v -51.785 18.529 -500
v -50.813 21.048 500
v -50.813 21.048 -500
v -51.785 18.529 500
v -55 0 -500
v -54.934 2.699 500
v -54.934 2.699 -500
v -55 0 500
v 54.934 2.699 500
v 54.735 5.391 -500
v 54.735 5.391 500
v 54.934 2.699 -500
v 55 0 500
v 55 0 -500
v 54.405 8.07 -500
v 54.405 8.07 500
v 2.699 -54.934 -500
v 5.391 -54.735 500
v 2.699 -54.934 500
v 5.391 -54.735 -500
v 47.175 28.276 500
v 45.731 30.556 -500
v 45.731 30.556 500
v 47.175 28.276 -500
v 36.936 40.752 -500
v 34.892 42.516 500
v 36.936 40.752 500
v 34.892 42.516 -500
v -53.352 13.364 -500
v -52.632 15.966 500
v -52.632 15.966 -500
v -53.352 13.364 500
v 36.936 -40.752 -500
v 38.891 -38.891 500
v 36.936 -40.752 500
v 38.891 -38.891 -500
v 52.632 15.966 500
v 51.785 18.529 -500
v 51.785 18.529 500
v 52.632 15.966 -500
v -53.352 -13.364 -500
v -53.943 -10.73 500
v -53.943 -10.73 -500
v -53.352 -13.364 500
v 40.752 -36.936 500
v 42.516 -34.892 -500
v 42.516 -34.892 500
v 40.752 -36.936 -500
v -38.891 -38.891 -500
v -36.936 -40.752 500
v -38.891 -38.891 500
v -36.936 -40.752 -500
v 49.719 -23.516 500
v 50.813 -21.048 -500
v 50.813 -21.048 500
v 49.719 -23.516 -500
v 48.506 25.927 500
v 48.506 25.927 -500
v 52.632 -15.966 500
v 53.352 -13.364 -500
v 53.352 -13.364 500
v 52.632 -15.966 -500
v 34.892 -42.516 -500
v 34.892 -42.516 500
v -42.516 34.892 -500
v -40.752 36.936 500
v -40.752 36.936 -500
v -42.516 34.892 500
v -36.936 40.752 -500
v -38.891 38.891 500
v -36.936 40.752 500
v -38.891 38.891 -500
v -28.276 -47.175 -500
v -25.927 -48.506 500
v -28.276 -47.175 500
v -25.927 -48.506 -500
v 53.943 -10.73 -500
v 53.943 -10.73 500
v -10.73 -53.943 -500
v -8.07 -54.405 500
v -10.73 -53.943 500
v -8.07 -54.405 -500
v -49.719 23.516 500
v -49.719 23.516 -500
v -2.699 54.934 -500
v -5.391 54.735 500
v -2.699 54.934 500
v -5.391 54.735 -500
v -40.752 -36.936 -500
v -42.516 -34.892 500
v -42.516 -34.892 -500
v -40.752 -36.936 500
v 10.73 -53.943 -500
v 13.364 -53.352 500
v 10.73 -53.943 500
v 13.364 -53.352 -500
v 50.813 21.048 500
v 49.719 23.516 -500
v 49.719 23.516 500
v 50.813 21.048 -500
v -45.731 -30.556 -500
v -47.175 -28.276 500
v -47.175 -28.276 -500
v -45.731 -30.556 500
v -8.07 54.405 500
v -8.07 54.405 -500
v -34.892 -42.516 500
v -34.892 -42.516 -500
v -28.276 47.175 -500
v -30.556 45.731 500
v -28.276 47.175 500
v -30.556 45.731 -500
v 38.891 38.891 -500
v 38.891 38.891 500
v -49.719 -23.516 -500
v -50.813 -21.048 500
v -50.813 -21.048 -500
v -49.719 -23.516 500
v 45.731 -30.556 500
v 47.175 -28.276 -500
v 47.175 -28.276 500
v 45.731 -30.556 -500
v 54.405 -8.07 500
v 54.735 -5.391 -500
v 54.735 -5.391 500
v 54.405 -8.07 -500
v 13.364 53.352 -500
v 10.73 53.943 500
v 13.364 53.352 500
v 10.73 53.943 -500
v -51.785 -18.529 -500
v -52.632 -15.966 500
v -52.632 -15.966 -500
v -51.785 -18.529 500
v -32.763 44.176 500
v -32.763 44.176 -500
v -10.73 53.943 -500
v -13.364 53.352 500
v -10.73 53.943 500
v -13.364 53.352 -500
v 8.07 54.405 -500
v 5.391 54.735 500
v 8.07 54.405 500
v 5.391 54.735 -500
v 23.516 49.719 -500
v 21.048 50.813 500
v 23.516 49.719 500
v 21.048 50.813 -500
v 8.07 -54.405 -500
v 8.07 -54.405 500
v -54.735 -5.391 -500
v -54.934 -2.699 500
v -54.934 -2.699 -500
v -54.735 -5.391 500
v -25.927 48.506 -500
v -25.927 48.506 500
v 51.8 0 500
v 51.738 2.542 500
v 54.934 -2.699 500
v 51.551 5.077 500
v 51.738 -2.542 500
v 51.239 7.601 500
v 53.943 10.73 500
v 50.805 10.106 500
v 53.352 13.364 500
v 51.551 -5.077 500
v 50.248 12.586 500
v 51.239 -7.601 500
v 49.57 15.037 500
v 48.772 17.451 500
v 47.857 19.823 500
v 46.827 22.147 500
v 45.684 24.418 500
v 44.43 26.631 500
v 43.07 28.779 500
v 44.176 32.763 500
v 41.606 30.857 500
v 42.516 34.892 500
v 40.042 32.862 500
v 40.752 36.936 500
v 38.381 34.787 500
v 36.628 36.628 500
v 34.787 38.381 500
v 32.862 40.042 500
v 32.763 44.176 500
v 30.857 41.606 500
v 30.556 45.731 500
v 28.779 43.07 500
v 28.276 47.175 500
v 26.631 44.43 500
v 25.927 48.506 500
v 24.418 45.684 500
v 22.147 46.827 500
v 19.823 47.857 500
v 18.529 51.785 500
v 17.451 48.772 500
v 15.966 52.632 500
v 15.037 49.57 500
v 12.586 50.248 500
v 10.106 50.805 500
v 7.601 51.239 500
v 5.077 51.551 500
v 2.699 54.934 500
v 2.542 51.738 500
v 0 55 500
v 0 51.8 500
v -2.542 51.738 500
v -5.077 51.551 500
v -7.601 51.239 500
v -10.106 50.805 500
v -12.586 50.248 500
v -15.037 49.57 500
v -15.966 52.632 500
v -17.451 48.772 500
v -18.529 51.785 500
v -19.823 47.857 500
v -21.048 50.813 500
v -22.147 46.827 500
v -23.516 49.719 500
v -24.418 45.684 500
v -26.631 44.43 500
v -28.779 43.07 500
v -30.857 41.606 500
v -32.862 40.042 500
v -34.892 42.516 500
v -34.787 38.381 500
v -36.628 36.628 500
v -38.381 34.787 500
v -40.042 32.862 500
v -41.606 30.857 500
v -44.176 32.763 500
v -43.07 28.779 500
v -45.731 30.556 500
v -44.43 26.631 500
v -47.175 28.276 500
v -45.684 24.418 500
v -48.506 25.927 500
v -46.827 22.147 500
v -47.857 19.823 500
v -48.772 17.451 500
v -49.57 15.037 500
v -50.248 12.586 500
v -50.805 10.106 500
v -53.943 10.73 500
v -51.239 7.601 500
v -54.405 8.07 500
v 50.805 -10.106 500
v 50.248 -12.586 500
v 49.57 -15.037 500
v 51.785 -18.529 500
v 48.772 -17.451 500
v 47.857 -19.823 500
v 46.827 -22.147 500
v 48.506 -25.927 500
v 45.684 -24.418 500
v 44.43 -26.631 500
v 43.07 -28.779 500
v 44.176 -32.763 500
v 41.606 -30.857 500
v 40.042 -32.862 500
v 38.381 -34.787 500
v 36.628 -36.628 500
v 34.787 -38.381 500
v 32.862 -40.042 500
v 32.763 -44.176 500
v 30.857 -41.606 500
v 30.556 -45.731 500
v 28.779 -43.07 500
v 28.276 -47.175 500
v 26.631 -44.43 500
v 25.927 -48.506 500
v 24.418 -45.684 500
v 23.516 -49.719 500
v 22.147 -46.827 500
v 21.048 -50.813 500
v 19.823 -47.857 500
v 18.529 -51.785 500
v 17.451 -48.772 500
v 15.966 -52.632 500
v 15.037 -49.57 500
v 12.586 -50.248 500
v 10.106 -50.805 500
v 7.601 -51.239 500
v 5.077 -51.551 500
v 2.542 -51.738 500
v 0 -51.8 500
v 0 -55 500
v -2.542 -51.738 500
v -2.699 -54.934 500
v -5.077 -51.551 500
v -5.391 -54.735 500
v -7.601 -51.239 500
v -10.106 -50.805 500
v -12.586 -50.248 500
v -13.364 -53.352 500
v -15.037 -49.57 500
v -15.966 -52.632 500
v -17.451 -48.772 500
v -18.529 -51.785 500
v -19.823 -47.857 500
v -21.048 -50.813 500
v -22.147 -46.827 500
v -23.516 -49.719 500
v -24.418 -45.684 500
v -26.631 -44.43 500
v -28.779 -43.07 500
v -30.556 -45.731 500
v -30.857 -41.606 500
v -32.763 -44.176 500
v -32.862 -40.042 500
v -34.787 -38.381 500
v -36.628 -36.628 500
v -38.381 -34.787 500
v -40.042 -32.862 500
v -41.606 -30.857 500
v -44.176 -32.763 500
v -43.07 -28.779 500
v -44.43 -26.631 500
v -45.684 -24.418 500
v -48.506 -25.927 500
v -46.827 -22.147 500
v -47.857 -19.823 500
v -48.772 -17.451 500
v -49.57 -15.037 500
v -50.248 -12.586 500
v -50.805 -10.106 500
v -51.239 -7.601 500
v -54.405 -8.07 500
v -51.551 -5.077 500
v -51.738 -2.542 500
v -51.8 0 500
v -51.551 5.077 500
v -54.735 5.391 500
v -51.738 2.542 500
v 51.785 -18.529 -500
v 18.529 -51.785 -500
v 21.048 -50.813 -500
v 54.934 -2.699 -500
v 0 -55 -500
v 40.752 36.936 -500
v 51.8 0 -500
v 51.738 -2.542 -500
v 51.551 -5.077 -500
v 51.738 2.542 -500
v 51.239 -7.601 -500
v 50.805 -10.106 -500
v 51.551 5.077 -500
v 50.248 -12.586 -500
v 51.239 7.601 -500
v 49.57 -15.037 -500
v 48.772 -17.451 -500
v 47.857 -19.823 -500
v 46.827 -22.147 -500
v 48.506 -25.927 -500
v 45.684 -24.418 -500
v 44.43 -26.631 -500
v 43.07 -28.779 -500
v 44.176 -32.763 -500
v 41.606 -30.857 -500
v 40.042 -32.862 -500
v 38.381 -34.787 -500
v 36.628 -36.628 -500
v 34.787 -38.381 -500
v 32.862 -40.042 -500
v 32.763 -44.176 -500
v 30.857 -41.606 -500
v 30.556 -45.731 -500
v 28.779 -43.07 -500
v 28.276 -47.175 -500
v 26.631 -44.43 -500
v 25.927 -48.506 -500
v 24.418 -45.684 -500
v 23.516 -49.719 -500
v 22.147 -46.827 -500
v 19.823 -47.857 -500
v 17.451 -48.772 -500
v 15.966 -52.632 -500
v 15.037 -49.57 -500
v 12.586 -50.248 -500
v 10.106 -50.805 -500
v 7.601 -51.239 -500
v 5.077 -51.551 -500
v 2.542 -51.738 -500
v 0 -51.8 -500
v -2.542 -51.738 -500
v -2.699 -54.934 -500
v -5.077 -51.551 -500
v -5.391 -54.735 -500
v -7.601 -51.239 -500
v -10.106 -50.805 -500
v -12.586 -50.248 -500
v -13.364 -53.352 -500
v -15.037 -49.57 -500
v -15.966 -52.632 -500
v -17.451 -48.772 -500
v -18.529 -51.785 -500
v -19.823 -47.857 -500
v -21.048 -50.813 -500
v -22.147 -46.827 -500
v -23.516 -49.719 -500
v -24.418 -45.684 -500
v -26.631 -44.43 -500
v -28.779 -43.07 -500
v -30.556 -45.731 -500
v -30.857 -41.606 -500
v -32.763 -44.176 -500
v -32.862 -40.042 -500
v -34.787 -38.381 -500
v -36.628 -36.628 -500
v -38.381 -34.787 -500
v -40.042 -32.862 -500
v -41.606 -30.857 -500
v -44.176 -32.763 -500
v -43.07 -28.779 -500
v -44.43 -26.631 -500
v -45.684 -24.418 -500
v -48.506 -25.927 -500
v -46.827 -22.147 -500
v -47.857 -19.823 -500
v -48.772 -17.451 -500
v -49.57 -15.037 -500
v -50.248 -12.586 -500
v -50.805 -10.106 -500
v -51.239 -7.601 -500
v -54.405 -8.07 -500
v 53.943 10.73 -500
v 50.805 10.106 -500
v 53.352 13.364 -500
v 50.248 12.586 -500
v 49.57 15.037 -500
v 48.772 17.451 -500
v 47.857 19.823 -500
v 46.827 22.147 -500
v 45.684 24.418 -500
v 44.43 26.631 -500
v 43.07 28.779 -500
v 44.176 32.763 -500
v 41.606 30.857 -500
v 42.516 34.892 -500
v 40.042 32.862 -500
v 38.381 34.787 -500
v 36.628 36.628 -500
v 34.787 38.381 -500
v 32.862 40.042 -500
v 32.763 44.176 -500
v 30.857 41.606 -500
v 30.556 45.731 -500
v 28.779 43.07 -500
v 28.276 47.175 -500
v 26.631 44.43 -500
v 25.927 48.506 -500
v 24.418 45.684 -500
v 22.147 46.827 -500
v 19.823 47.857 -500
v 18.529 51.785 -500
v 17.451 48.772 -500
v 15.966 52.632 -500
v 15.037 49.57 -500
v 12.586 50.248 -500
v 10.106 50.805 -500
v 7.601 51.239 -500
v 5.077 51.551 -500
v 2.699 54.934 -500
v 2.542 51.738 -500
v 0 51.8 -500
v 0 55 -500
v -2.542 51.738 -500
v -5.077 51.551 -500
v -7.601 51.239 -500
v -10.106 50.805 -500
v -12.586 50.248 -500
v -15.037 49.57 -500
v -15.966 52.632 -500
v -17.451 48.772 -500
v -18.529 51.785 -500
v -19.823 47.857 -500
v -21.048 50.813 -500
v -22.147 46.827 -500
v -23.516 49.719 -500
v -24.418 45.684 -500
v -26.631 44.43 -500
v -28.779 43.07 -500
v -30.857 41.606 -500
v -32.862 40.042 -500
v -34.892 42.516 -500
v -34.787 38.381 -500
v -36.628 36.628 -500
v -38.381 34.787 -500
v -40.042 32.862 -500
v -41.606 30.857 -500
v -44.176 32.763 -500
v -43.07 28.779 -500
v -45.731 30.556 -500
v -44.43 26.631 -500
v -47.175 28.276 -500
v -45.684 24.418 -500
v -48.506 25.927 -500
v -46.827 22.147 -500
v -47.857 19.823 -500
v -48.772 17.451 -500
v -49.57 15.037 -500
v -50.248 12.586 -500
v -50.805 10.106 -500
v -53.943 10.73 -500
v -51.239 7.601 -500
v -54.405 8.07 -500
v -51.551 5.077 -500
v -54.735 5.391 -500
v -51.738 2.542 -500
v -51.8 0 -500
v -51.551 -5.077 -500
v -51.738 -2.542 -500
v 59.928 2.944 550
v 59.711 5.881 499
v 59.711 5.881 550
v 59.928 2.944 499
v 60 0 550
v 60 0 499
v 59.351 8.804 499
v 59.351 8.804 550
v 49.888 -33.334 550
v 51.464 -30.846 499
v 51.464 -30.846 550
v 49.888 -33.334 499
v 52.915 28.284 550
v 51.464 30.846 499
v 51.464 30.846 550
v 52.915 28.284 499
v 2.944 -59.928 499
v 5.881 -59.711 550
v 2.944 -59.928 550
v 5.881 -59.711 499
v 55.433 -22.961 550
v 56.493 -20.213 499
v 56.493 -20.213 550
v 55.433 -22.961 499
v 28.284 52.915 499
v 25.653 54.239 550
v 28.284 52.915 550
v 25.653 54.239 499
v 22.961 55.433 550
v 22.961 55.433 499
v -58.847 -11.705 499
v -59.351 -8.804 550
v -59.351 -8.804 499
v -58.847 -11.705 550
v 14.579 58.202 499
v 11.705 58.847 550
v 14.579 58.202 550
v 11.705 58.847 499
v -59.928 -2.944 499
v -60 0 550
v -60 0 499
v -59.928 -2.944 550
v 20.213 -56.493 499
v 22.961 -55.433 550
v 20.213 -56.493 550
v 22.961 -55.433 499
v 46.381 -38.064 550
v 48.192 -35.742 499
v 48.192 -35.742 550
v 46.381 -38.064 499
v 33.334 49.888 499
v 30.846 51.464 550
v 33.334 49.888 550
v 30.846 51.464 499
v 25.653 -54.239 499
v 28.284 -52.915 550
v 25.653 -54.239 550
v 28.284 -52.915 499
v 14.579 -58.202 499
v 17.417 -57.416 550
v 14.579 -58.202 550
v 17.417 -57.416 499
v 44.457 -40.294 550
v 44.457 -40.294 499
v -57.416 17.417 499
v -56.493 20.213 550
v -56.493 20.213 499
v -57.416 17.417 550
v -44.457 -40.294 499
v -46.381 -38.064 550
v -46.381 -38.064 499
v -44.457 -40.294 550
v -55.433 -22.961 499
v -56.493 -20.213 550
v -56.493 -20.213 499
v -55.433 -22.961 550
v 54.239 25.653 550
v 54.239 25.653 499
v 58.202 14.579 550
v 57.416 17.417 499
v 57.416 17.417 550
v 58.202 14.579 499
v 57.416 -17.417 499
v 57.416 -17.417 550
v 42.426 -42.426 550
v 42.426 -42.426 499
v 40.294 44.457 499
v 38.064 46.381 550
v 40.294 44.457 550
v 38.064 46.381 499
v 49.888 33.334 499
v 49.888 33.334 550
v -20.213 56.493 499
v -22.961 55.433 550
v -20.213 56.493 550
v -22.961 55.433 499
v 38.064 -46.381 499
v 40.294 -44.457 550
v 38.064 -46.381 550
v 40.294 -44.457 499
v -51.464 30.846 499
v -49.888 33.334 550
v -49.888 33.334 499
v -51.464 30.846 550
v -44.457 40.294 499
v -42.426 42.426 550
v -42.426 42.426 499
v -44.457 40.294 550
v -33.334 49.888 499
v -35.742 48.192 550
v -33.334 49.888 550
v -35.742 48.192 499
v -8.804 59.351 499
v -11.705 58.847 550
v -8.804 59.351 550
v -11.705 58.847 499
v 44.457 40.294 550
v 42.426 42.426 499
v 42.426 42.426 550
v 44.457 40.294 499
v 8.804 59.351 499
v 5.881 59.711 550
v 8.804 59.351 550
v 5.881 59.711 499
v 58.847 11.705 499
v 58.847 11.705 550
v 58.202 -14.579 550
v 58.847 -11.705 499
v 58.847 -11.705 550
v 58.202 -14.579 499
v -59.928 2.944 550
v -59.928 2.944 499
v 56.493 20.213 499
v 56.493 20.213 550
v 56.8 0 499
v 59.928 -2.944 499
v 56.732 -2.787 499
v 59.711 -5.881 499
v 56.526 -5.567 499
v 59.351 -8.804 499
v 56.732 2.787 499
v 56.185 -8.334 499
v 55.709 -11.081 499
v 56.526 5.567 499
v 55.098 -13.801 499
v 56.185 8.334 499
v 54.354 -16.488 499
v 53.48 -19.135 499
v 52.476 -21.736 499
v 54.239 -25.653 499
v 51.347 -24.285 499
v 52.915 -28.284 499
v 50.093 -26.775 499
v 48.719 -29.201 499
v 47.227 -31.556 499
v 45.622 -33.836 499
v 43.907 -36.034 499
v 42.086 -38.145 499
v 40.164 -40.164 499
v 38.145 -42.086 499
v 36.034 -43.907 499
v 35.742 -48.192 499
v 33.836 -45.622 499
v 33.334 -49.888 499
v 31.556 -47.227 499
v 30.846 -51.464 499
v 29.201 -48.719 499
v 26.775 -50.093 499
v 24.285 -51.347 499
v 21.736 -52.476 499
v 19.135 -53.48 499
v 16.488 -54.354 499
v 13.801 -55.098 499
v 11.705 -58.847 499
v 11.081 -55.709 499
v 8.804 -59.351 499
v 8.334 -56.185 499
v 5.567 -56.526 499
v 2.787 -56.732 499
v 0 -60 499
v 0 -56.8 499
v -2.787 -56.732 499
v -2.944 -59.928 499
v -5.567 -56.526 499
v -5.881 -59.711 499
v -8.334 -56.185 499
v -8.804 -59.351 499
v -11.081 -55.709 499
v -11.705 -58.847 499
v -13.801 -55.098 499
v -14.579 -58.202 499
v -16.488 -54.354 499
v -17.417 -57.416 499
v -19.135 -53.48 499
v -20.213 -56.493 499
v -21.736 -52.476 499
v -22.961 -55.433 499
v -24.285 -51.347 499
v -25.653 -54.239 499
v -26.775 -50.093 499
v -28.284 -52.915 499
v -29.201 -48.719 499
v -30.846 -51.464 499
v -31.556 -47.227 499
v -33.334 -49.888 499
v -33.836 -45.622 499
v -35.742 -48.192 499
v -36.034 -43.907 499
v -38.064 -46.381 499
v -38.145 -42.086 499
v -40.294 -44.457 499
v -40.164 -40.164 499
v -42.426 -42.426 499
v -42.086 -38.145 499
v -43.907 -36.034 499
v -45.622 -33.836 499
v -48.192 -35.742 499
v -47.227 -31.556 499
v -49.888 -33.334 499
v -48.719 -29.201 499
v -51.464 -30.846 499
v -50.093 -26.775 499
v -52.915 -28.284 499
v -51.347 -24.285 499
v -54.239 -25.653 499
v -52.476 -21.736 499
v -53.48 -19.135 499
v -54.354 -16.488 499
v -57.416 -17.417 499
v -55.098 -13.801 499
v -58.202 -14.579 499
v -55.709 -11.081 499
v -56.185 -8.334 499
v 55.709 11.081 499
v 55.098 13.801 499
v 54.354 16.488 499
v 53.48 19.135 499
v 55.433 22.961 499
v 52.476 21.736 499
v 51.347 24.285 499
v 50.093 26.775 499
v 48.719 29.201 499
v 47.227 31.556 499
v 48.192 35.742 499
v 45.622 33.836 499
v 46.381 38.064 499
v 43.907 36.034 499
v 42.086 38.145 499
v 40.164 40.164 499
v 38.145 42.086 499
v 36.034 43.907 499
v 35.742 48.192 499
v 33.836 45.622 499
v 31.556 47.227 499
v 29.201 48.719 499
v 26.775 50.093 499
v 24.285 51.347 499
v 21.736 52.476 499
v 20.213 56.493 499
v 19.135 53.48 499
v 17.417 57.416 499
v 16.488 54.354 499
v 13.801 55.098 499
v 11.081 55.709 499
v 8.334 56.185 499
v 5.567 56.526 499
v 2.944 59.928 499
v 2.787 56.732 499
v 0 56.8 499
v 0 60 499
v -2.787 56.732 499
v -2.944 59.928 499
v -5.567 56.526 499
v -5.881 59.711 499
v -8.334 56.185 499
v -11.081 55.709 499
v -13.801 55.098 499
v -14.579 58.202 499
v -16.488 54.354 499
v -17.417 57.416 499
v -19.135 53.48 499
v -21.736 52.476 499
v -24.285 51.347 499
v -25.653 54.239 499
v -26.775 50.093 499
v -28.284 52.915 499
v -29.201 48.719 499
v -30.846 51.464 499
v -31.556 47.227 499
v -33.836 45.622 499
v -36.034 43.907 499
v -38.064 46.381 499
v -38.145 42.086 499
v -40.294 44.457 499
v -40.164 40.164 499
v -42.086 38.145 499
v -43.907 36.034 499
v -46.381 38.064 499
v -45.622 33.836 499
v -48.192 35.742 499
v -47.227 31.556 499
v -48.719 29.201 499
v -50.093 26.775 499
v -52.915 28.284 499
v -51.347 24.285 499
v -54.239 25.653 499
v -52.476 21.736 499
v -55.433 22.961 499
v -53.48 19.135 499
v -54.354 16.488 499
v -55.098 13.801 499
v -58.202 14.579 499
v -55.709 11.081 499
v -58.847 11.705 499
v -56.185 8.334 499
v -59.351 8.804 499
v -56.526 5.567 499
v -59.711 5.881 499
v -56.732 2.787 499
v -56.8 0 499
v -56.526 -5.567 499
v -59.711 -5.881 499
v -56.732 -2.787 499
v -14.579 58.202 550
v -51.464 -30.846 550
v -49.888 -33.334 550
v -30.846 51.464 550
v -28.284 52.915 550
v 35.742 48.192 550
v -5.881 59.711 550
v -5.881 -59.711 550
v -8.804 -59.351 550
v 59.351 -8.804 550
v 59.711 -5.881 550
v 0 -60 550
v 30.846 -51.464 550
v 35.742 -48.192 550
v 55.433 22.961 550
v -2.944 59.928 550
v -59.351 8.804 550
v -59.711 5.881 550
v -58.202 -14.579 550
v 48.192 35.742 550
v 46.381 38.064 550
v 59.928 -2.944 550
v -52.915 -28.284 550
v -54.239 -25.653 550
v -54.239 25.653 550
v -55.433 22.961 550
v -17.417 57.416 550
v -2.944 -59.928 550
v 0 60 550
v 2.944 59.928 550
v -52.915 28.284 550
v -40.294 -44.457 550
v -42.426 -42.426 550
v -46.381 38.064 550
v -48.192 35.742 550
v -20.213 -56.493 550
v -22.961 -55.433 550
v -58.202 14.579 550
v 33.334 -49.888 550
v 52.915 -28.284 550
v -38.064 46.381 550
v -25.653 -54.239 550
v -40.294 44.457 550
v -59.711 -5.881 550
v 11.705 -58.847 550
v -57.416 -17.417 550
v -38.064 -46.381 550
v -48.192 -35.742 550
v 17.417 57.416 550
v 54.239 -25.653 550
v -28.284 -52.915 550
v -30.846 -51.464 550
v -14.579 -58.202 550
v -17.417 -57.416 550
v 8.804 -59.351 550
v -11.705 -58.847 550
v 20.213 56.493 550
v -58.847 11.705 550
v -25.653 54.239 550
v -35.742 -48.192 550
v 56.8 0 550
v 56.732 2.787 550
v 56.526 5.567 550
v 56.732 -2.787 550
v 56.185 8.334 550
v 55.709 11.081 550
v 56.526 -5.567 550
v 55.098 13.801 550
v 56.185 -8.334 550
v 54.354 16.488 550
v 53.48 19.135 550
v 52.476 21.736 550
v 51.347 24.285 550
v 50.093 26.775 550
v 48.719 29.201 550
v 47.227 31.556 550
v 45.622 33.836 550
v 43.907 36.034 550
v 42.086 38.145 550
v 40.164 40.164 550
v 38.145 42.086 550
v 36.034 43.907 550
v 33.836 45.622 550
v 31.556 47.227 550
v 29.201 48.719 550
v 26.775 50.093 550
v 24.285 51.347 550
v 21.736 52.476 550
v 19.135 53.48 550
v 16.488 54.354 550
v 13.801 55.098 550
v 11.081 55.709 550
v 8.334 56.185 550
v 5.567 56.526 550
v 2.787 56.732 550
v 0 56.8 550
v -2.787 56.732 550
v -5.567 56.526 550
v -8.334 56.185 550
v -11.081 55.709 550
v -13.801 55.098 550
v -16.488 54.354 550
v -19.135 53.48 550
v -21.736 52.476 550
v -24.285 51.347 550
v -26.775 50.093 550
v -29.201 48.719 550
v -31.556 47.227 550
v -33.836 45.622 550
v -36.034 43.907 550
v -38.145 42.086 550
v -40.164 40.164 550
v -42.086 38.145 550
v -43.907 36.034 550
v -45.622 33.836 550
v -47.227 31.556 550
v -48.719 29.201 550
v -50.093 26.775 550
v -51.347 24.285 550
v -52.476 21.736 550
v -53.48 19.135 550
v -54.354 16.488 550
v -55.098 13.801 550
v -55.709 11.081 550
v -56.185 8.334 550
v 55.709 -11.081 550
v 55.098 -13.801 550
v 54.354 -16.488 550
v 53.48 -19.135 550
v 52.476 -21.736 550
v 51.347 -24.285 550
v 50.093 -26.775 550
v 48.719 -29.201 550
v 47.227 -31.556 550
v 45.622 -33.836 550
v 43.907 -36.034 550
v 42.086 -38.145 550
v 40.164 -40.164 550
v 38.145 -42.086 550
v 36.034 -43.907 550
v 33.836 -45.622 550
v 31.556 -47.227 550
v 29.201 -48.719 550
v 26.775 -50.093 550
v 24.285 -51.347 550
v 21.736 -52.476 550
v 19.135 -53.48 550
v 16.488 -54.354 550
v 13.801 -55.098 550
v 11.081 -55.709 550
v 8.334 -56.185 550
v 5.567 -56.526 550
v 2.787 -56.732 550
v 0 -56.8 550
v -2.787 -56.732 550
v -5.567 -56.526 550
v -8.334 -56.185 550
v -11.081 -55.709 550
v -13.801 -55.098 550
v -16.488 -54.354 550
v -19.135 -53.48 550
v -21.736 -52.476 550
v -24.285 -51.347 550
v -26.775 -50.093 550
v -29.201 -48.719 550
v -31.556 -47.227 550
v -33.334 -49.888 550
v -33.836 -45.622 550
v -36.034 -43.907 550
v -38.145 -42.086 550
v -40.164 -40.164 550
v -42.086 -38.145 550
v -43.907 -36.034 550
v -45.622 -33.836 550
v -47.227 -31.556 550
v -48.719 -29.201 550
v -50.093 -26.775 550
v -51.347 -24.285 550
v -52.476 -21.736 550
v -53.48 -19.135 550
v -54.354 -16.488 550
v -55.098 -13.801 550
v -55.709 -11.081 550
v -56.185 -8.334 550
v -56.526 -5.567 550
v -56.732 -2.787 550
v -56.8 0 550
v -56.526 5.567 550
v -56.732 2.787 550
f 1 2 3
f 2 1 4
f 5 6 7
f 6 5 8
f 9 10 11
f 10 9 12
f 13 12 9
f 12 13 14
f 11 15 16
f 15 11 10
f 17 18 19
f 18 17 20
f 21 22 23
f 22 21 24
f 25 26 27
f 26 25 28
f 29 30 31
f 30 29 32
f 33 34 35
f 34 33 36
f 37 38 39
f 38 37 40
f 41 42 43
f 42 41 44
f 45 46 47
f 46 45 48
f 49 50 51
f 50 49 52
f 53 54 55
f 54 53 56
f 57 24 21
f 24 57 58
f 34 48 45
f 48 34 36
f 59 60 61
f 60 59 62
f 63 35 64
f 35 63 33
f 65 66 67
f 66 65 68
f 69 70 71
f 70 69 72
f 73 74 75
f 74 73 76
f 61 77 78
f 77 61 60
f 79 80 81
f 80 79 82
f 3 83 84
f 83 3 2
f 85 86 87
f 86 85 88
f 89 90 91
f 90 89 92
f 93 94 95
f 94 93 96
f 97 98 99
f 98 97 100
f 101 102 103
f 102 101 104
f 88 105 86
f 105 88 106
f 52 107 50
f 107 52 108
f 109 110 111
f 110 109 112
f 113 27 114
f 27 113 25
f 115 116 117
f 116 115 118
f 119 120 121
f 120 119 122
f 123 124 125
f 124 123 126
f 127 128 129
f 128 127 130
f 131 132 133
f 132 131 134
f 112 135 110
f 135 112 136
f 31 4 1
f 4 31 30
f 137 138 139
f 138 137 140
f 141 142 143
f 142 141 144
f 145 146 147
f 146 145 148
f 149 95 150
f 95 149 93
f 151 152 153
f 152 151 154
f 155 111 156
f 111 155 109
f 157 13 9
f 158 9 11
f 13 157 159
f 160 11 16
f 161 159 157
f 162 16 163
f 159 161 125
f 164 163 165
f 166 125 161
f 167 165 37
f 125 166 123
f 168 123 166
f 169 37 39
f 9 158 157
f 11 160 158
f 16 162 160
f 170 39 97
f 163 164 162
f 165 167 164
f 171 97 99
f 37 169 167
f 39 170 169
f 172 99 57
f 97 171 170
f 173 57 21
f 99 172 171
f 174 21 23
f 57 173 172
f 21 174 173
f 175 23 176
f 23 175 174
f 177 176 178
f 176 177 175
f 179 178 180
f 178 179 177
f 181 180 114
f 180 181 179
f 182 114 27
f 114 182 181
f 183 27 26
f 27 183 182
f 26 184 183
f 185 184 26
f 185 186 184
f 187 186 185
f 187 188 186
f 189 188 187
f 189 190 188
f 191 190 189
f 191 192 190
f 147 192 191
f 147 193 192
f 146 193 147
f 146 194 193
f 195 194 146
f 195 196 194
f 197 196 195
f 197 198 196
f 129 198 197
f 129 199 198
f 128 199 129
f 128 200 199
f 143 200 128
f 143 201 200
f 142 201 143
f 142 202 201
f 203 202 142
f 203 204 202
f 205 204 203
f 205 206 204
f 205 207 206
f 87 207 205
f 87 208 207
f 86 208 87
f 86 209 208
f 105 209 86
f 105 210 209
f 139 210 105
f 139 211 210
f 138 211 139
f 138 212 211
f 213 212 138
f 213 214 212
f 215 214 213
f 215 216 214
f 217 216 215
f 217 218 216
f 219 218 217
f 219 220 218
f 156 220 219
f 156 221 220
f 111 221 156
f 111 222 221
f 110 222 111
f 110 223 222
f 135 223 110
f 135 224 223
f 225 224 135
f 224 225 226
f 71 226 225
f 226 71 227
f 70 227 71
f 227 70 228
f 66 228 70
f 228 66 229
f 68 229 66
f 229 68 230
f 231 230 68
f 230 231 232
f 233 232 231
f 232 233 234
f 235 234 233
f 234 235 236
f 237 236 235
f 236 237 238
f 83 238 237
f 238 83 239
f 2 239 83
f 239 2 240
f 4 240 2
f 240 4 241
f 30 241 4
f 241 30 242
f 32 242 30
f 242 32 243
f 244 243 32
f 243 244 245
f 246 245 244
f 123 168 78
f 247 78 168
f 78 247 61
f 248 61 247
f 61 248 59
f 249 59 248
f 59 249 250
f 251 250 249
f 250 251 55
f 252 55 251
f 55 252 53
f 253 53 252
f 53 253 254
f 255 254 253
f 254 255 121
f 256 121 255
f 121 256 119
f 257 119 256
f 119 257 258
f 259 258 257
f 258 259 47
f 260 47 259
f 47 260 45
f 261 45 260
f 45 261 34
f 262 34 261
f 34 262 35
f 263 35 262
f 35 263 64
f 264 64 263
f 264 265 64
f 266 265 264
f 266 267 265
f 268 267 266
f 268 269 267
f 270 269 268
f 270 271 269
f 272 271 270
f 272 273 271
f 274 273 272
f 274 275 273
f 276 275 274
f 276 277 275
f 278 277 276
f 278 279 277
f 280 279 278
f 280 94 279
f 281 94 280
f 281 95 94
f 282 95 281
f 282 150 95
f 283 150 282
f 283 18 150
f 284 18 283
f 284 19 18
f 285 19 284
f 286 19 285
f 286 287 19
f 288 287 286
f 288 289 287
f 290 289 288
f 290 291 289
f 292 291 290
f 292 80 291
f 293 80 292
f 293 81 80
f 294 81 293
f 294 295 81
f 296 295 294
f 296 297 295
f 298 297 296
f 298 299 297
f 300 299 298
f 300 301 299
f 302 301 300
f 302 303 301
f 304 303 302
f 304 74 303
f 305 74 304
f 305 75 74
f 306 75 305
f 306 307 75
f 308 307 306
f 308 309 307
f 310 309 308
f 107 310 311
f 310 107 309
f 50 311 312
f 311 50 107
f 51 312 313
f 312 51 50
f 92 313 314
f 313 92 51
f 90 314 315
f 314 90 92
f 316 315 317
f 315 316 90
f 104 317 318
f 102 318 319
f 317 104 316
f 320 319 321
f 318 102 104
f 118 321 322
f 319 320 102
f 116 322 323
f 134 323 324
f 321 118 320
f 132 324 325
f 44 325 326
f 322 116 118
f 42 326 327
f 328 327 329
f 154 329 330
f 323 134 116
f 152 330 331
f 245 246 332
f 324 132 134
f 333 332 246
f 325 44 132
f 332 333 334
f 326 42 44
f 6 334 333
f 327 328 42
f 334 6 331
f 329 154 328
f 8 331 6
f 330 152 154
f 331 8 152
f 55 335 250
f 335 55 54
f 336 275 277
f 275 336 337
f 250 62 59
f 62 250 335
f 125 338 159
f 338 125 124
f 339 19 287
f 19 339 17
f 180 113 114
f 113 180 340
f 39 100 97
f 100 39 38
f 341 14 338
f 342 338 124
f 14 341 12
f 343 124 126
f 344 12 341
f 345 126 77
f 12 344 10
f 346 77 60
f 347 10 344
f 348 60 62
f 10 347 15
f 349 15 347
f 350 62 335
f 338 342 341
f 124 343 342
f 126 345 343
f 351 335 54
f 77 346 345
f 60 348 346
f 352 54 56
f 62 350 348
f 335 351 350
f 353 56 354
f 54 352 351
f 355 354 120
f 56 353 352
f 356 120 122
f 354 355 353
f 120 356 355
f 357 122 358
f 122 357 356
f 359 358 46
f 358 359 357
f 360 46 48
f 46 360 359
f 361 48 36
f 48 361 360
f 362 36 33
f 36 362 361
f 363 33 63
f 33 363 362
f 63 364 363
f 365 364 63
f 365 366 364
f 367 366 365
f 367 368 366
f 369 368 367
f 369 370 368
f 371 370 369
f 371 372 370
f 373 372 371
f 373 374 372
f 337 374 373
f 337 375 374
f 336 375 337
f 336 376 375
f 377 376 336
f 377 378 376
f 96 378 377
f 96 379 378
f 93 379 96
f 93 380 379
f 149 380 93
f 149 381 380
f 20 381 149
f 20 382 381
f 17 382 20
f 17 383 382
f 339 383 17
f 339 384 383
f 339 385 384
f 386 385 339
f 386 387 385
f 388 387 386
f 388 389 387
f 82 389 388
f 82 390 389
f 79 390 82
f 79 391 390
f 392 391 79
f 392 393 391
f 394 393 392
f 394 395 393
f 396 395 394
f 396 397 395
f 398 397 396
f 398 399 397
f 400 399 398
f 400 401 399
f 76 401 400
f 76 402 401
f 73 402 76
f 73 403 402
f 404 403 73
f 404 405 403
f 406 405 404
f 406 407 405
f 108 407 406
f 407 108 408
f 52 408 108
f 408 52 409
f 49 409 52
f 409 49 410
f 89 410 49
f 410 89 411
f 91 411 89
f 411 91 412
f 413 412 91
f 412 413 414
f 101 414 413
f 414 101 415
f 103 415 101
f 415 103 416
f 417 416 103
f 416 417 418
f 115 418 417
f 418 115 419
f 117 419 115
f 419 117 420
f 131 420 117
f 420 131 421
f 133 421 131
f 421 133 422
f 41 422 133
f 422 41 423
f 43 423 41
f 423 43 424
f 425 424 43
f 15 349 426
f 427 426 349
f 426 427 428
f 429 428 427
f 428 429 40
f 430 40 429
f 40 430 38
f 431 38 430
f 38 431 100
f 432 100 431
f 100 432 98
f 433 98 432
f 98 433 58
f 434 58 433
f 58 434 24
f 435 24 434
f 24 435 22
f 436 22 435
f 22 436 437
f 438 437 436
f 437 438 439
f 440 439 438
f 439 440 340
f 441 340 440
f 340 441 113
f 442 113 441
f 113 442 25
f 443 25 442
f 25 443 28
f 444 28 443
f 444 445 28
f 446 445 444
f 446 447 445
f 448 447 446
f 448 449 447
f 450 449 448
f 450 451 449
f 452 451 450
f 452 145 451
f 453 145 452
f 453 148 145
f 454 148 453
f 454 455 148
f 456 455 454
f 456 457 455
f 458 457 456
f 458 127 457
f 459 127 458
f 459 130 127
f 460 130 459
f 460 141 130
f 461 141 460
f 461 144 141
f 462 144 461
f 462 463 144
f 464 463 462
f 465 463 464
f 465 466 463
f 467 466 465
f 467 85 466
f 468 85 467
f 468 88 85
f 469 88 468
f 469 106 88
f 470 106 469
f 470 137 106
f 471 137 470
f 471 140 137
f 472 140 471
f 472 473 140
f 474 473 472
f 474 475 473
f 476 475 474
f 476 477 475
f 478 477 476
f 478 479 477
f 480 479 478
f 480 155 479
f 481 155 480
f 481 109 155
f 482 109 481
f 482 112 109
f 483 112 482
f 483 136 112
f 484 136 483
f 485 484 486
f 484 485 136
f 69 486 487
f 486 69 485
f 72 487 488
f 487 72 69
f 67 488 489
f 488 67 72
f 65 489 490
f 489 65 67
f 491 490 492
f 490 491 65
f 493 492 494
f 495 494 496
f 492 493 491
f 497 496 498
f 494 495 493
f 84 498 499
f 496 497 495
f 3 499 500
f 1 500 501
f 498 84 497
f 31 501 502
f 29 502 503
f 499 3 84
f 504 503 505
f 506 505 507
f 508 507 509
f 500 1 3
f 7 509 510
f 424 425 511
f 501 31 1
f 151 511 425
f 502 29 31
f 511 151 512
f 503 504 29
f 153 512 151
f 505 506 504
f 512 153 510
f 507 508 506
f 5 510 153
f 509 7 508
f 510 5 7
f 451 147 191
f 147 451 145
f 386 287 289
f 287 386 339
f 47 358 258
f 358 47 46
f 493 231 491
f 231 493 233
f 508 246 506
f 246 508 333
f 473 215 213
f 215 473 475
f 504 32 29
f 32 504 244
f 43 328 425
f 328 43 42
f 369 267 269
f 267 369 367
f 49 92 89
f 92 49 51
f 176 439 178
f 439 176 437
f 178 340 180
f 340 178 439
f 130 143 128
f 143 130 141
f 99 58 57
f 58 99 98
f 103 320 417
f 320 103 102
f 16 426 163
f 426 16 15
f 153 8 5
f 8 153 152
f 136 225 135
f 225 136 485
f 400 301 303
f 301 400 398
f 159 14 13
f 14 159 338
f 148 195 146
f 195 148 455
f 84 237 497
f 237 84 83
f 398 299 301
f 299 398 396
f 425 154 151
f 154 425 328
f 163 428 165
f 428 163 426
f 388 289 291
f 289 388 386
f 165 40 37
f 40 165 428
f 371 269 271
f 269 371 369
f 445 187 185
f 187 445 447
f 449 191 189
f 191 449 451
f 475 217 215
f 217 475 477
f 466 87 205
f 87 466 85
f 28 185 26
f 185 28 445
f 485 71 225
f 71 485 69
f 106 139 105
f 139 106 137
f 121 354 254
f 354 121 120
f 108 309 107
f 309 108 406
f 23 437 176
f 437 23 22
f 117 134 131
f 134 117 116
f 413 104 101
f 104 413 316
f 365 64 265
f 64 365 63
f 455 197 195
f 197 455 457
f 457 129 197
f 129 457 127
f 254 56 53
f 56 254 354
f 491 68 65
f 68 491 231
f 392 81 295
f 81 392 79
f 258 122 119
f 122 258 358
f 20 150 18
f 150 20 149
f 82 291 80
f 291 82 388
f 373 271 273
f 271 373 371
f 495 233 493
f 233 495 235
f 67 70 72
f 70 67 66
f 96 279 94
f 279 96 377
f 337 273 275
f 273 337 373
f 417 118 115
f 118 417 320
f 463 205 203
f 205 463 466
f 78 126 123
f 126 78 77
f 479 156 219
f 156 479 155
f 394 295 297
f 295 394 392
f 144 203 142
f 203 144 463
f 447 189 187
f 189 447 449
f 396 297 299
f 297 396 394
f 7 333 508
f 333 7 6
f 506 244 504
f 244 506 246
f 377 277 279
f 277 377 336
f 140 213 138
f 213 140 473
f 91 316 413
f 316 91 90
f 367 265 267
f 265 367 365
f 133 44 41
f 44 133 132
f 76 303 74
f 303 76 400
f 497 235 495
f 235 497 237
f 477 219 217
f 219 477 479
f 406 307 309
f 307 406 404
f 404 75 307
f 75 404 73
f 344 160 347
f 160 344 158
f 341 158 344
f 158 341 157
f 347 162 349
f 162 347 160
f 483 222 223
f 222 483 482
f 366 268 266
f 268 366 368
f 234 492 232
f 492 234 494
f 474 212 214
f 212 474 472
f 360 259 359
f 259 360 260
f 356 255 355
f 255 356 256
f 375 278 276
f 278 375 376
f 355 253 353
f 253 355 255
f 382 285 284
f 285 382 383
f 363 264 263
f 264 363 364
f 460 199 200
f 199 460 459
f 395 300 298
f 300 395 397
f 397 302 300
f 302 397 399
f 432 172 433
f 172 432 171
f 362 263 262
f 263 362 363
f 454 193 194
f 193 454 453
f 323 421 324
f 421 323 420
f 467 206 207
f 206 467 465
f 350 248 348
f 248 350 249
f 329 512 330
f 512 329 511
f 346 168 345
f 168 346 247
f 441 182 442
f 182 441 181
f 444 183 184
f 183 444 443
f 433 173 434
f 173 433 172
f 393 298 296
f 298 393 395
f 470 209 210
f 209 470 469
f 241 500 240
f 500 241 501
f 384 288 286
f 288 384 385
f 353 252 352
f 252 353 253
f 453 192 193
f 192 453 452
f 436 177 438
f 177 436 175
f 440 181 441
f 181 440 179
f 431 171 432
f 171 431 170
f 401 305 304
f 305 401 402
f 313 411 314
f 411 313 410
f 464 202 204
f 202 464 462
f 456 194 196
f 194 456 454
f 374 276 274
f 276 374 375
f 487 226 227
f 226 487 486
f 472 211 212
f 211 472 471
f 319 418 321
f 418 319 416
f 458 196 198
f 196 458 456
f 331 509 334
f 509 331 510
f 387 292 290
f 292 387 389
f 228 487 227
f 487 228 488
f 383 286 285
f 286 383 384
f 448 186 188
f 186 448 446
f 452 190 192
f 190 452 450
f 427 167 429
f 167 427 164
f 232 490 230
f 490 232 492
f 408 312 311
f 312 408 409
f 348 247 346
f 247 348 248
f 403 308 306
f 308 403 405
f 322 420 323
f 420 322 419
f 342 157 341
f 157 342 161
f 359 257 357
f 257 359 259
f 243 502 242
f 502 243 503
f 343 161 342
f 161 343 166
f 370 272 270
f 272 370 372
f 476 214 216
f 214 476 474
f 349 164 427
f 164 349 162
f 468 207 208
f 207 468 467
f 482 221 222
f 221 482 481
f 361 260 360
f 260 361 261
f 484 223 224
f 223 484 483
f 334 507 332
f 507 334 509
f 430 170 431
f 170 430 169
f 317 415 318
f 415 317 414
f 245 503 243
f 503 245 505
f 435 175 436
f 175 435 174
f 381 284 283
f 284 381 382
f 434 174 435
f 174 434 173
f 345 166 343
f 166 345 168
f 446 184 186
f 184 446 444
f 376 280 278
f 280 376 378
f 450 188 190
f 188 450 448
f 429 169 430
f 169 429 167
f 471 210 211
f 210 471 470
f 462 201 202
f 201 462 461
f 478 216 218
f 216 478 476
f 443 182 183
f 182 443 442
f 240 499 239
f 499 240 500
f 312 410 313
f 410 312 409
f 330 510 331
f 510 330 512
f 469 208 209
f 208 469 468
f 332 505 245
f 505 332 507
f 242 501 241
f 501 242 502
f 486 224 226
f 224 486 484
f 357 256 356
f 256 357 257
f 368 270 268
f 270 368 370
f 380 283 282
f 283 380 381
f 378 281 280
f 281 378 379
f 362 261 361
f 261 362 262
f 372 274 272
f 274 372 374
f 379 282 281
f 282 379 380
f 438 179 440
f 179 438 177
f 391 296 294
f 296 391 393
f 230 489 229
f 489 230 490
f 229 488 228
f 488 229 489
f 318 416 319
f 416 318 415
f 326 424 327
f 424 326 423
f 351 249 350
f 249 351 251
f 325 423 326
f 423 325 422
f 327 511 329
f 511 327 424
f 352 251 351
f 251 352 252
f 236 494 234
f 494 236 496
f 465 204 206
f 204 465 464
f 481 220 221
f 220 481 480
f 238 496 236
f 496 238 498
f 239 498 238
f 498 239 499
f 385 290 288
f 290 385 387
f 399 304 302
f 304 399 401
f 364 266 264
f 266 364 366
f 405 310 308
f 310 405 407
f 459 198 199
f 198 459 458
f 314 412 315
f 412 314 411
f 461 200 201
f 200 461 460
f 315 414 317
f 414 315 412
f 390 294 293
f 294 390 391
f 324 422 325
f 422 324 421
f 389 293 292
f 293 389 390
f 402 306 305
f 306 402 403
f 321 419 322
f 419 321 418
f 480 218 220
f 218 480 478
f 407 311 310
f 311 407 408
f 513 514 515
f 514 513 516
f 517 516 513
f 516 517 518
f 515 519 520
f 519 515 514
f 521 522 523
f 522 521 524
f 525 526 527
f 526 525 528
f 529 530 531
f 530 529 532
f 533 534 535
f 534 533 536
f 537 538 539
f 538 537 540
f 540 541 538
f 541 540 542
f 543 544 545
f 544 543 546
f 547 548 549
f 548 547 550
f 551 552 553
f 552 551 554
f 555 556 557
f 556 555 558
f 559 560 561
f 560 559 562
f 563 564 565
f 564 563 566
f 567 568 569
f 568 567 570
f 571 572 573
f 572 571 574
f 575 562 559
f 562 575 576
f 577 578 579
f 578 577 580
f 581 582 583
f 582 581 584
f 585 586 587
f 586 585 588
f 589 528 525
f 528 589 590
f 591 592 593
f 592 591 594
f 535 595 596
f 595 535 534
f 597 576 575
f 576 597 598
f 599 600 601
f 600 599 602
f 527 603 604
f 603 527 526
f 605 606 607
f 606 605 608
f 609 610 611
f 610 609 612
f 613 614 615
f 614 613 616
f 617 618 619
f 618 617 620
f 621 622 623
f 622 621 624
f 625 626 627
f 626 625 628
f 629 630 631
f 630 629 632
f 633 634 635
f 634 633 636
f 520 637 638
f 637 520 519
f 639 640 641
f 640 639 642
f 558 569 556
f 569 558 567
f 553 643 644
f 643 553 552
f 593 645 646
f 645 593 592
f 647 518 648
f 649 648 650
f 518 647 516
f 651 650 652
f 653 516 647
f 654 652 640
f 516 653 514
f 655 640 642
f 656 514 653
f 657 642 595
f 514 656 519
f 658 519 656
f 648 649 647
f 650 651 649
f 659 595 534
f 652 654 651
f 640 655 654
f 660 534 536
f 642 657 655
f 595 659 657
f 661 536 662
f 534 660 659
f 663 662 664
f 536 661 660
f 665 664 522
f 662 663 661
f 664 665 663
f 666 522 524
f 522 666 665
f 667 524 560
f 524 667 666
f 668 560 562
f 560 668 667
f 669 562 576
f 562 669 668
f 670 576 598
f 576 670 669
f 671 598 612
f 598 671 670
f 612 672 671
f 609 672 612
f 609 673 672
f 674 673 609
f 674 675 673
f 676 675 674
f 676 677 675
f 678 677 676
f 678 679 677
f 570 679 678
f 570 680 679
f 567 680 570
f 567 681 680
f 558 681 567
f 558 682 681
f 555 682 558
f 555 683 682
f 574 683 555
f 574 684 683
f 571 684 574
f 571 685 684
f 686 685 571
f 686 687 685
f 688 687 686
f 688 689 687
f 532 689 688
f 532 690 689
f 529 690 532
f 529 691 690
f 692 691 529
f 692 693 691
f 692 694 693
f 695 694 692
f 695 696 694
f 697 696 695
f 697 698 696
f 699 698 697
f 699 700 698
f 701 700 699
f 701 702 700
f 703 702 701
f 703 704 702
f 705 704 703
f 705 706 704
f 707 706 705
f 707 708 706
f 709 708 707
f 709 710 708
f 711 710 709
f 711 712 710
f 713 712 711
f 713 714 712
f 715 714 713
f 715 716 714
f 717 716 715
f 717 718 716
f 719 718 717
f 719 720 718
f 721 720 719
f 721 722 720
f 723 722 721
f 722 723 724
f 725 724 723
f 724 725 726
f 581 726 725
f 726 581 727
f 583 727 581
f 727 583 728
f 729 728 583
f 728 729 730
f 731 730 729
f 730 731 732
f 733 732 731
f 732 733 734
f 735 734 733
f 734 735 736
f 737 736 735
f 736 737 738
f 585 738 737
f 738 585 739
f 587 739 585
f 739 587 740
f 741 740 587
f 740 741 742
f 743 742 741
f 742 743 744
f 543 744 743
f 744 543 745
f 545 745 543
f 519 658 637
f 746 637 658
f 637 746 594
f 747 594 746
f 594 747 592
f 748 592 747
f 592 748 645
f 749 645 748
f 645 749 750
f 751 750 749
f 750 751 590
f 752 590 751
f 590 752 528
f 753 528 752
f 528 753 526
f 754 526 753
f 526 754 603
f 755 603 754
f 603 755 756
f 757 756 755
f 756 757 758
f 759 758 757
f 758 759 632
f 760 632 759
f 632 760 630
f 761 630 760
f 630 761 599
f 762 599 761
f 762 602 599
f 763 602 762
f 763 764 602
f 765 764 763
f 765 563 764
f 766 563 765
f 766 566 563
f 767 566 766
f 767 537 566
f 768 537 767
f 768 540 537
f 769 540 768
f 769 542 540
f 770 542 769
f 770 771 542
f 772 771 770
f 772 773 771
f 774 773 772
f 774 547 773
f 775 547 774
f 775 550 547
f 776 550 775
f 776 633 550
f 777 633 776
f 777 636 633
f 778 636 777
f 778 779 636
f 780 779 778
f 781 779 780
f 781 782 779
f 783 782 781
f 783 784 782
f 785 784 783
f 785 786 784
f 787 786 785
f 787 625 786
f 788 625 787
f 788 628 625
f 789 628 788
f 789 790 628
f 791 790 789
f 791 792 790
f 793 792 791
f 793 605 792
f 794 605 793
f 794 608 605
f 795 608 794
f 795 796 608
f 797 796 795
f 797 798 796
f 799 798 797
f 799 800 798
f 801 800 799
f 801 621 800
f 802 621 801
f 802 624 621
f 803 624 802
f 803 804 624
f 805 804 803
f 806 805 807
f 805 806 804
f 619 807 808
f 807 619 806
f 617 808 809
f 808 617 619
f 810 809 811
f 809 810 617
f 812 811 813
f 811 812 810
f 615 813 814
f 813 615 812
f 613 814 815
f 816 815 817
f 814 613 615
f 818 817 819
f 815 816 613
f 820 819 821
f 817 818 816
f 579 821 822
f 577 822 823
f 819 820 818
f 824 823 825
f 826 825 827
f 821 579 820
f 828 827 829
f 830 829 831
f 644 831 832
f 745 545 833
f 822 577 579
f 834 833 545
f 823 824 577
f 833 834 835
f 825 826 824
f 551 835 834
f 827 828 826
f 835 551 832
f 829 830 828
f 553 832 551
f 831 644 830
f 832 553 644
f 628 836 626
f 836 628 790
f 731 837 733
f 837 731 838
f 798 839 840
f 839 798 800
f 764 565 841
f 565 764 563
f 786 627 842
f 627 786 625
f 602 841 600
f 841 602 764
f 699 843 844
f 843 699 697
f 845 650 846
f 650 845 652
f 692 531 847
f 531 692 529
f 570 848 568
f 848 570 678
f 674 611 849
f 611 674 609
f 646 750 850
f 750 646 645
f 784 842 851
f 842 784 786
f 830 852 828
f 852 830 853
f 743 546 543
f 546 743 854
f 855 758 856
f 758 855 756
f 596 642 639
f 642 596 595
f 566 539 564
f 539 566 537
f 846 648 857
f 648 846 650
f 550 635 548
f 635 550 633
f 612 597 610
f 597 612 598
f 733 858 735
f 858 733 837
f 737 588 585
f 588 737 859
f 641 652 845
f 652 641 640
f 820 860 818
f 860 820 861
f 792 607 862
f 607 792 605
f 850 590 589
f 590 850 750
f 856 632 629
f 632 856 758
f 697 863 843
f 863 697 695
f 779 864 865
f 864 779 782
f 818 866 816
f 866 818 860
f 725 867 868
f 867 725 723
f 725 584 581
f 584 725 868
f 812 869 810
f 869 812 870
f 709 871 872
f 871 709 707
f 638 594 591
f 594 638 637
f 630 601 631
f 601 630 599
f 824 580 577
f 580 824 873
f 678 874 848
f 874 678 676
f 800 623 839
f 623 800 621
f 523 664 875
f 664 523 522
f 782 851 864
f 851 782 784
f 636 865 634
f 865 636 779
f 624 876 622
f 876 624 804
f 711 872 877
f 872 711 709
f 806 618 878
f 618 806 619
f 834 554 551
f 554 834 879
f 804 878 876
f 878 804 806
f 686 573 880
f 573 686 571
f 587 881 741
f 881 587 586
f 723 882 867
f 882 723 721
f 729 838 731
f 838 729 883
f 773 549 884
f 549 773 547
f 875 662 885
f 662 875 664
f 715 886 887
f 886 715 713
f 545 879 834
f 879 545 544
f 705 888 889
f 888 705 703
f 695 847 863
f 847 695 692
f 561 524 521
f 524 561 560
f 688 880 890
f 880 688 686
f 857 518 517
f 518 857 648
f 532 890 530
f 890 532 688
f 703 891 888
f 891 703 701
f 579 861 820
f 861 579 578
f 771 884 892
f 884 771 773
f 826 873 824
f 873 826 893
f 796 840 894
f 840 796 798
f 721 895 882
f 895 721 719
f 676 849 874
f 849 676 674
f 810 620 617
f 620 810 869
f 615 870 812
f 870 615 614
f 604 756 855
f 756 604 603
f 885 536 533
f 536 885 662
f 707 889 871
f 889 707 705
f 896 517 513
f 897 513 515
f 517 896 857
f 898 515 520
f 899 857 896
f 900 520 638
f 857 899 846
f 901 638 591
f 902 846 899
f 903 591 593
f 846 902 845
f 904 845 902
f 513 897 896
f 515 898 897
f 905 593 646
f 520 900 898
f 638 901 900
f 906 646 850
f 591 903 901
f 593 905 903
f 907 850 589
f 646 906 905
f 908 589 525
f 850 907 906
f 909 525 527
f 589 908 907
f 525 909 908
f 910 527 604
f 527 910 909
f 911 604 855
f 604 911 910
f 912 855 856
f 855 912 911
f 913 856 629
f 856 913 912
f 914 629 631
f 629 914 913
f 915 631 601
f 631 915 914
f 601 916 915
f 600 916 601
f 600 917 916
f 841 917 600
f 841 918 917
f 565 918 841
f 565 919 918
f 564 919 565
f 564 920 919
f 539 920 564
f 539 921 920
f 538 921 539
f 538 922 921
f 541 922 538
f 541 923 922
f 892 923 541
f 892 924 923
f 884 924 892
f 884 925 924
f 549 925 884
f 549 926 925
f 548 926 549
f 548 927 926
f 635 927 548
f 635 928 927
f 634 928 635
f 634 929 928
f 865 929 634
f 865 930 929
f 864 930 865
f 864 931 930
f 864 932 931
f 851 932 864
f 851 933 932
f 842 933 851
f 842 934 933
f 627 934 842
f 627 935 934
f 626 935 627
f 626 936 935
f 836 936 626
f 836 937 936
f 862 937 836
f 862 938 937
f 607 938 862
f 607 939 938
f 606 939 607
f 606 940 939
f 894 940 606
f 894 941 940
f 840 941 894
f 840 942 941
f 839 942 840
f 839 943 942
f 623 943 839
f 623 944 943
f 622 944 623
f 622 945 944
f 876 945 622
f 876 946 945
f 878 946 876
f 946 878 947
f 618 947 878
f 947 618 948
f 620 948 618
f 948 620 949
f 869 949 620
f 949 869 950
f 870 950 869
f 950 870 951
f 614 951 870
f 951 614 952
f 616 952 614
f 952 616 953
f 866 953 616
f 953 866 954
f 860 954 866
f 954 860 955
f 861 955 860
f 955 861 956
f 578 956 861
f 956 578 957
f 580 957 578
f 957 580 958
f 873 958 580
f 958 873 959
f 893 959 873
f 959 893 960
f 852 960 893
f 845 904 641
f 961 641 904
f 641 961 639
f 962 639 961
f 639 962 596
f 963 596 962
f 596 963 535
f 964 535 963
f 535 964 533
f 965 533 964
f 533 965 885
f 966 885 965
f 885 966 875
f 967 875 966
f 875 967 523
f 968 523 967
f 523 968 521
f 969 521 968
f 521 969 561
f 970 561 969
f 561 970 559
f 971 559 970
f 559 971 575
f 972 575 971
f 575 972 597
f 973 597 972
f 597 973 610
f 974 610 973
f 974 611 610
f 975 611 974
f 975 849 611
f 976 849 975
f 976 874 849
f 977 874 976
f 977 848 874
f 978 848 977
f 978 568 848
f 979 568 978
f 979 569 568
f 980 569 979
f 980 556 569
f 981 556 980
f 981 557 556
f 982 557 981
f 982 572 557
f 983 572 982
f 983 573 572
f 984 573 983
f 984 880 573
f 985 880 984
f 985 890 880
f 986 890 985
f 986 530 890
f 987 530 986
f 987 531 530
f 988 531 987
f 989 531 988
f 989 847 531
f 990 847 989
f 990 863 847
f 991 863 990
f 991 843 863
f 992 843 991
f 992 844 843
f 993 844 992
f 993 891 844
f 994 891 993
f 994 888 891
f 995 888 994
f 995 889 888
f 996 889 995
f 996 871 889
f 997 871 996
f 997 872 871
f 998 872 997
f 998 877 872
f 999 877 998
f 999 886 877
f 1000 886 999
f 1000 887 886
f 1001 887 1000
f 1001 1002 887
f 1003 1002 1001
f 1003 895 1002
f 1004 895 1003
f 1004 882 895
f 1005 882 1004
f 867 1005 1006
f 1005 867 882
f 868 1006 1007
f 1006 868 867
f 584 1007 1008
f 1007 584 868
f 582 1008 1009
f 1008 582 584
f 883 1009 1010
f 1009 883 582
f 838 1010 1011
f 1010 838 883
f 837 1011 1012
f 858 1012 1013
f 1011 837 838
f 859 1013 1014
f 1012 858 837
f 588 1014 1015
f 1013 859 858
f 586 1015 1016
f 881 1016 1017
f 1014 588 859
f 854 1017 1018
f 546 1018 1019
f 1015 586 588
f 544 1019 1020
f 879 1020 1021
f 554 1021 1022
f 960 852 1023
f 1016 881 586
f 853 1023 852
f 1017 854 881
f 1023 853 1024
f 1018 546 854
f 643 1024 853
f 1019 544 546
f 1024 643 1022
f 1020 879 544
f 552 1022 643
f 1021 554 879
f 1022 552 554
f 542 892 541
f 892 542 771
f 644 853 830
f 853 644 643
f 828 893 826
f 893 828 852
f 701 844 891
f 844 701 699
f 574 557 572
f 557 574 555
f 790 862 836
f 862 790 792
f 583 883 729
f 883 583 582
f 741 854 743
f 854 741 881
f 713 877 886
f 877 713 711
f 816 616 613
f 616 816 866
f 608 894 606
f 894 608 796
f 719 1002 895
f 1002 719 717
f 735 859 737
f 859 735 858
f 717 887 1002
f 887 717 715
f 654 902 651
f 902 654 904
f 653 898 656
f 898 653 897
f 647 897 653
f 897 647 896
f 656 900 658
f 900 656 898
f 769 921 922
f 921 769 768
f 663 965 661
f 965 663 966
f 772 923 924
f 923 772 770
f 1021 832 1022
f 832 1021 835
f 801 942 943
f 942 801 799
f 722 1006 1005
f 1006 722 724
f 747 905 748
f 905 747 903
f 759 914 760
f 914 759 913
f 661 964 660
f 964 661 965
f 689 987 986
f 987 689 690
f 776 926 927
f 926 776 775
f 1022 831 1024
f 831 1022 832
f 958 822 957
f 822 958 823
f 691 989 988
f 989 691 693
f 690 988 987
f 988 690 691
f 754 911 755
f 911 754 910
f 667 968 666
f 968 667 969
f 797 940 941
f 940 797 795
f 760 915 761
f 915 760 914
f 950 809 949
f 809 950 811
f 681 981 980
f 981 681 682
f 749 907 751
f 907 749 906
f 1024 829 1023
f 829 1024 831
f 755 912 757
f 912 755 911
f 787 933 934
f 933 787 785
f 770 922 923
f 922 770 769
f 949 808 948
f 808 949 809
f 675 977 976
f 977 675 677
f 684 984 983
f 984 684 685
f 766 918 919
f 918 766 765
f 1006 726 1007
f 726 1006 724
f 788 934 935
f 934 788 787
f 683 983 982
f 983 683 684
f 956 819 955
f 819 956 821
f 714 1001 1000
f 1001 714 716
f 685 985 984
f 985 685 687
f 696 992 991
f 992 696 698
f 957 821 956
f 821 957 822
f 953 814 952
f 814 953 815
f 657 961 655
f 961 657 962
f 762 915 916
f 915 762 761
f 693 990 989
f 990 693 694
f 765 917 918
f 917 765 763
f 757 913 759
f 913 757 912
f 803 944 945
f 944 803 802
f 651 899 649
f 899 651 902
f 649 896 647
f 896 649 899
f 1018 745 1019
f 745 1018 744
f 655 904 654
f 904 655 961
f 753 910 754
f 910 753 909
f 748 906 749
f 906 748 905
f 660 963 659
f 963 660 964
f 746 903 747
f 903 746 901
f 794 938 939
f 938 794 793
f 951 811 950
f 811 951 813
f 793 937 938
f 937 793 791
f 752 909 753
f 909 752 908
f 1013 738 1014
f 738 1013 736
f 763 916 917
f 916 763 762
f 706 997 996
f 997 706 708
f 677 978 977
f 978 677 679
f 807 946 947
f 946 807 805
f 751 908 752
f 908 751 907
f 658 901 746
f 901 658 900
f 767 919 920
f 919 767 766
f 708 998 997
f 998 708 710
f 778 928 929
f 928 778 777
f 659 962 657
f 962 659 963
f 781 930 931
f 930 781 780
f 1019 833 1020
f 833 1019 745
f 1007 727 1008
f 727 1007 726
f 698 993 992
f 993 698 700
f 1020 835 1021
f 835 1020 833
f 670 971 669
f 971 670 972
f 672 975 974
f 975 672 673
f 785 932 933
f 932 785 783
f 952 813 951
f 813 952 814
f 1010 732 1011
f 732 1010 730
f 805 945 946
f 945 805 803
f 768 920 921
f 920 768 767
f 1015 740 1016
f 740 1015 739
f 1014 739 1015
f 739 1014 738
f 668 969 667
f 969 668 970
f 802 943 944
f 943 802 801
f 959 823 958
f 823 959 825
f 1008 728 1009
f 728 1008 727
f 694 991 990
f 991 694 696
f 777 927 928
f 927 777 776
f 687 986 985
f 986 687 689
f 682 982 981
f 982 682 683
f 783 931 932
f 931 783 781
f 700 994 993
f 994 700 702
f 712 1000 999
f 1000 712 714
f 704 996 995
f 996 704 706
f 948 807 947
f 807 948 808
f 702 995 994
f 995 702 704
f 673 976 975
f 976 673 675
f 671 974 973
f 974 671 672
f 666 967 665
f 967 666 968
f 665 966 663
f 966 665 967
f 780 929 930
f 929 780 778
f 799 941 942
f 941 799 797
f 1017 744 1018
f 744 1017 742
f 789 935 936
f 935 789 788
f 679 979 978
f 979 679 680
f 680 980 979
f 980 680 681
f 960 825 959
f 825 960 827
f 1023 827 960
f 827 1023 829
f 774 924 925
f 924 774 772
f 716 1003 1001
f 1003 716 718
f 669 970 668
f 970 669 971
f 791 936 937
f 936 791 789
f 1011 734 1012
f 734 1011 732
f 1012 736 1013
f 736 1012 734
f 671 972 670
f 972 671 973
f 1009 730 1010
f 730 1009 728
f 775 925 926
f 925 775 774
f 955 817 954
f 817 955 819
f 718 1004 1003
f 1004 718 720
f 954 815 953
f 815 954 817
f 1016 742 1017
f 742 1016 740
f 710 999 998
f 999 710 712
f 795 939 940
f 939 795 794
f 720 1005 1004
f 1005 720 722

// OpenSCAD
$fn = 128;

module ht_pipe_segment(length = 1000, diameter = 110) {
    wall_thickness = 3.2;          // typical HT 110 wall
    socket_len     = 50;           // end fitting length
    socket_extra_d = 10;           // socket OD increase
    overlap        = 1;            // ensure watertight union/difference

    union() {
        // Main pipe (hollow)
        ht_pipe(diameter = diameter, length = length, wall = wall_thickness);

        // End socket (hollow) connected to +Z end of pipe
        end_socket(
            pipe_diameter   = diameter,
            pipe_wall       = wall_thickness,
            socket_length   = socket_len,
            socket_extra_d  = socket_extra_d,
            pipe_length     = length,
            overlap         = overlap
        );
    }
}

module ht_pipe(diameter, length, wall) {
    outer_d = diameter;
    inner_d = outer_d - 2 * wall;
    difference() {
        cylinder(d = outer_d, h = length, center = true);
        cylinder(d = inner_d, h = length + 2, center = true); // +2 ensures full cut-through
    }
}

module end_socket(pipe_diameter, pipe_wall, socket_length, socket_extra_d, pipe_length, overlap) {
    socket_od = pipe_diameter + socket_extra_d;
    socket_id = socket_od - 2 * pipe_wall;

    // Place socket so it overlaps the pipe end by 'overlap'
    translate([0, 0, pipe_length/2 - overlap])
        difference() {
            cylinder(d = socket_od, h = socket_length + overlap, center = false);
            translate([0, 0, -1])
                cylinder(d = socket_id, h = socket_length + overlap + 2, center = false);
        }
}

ht_pipe_segment();
